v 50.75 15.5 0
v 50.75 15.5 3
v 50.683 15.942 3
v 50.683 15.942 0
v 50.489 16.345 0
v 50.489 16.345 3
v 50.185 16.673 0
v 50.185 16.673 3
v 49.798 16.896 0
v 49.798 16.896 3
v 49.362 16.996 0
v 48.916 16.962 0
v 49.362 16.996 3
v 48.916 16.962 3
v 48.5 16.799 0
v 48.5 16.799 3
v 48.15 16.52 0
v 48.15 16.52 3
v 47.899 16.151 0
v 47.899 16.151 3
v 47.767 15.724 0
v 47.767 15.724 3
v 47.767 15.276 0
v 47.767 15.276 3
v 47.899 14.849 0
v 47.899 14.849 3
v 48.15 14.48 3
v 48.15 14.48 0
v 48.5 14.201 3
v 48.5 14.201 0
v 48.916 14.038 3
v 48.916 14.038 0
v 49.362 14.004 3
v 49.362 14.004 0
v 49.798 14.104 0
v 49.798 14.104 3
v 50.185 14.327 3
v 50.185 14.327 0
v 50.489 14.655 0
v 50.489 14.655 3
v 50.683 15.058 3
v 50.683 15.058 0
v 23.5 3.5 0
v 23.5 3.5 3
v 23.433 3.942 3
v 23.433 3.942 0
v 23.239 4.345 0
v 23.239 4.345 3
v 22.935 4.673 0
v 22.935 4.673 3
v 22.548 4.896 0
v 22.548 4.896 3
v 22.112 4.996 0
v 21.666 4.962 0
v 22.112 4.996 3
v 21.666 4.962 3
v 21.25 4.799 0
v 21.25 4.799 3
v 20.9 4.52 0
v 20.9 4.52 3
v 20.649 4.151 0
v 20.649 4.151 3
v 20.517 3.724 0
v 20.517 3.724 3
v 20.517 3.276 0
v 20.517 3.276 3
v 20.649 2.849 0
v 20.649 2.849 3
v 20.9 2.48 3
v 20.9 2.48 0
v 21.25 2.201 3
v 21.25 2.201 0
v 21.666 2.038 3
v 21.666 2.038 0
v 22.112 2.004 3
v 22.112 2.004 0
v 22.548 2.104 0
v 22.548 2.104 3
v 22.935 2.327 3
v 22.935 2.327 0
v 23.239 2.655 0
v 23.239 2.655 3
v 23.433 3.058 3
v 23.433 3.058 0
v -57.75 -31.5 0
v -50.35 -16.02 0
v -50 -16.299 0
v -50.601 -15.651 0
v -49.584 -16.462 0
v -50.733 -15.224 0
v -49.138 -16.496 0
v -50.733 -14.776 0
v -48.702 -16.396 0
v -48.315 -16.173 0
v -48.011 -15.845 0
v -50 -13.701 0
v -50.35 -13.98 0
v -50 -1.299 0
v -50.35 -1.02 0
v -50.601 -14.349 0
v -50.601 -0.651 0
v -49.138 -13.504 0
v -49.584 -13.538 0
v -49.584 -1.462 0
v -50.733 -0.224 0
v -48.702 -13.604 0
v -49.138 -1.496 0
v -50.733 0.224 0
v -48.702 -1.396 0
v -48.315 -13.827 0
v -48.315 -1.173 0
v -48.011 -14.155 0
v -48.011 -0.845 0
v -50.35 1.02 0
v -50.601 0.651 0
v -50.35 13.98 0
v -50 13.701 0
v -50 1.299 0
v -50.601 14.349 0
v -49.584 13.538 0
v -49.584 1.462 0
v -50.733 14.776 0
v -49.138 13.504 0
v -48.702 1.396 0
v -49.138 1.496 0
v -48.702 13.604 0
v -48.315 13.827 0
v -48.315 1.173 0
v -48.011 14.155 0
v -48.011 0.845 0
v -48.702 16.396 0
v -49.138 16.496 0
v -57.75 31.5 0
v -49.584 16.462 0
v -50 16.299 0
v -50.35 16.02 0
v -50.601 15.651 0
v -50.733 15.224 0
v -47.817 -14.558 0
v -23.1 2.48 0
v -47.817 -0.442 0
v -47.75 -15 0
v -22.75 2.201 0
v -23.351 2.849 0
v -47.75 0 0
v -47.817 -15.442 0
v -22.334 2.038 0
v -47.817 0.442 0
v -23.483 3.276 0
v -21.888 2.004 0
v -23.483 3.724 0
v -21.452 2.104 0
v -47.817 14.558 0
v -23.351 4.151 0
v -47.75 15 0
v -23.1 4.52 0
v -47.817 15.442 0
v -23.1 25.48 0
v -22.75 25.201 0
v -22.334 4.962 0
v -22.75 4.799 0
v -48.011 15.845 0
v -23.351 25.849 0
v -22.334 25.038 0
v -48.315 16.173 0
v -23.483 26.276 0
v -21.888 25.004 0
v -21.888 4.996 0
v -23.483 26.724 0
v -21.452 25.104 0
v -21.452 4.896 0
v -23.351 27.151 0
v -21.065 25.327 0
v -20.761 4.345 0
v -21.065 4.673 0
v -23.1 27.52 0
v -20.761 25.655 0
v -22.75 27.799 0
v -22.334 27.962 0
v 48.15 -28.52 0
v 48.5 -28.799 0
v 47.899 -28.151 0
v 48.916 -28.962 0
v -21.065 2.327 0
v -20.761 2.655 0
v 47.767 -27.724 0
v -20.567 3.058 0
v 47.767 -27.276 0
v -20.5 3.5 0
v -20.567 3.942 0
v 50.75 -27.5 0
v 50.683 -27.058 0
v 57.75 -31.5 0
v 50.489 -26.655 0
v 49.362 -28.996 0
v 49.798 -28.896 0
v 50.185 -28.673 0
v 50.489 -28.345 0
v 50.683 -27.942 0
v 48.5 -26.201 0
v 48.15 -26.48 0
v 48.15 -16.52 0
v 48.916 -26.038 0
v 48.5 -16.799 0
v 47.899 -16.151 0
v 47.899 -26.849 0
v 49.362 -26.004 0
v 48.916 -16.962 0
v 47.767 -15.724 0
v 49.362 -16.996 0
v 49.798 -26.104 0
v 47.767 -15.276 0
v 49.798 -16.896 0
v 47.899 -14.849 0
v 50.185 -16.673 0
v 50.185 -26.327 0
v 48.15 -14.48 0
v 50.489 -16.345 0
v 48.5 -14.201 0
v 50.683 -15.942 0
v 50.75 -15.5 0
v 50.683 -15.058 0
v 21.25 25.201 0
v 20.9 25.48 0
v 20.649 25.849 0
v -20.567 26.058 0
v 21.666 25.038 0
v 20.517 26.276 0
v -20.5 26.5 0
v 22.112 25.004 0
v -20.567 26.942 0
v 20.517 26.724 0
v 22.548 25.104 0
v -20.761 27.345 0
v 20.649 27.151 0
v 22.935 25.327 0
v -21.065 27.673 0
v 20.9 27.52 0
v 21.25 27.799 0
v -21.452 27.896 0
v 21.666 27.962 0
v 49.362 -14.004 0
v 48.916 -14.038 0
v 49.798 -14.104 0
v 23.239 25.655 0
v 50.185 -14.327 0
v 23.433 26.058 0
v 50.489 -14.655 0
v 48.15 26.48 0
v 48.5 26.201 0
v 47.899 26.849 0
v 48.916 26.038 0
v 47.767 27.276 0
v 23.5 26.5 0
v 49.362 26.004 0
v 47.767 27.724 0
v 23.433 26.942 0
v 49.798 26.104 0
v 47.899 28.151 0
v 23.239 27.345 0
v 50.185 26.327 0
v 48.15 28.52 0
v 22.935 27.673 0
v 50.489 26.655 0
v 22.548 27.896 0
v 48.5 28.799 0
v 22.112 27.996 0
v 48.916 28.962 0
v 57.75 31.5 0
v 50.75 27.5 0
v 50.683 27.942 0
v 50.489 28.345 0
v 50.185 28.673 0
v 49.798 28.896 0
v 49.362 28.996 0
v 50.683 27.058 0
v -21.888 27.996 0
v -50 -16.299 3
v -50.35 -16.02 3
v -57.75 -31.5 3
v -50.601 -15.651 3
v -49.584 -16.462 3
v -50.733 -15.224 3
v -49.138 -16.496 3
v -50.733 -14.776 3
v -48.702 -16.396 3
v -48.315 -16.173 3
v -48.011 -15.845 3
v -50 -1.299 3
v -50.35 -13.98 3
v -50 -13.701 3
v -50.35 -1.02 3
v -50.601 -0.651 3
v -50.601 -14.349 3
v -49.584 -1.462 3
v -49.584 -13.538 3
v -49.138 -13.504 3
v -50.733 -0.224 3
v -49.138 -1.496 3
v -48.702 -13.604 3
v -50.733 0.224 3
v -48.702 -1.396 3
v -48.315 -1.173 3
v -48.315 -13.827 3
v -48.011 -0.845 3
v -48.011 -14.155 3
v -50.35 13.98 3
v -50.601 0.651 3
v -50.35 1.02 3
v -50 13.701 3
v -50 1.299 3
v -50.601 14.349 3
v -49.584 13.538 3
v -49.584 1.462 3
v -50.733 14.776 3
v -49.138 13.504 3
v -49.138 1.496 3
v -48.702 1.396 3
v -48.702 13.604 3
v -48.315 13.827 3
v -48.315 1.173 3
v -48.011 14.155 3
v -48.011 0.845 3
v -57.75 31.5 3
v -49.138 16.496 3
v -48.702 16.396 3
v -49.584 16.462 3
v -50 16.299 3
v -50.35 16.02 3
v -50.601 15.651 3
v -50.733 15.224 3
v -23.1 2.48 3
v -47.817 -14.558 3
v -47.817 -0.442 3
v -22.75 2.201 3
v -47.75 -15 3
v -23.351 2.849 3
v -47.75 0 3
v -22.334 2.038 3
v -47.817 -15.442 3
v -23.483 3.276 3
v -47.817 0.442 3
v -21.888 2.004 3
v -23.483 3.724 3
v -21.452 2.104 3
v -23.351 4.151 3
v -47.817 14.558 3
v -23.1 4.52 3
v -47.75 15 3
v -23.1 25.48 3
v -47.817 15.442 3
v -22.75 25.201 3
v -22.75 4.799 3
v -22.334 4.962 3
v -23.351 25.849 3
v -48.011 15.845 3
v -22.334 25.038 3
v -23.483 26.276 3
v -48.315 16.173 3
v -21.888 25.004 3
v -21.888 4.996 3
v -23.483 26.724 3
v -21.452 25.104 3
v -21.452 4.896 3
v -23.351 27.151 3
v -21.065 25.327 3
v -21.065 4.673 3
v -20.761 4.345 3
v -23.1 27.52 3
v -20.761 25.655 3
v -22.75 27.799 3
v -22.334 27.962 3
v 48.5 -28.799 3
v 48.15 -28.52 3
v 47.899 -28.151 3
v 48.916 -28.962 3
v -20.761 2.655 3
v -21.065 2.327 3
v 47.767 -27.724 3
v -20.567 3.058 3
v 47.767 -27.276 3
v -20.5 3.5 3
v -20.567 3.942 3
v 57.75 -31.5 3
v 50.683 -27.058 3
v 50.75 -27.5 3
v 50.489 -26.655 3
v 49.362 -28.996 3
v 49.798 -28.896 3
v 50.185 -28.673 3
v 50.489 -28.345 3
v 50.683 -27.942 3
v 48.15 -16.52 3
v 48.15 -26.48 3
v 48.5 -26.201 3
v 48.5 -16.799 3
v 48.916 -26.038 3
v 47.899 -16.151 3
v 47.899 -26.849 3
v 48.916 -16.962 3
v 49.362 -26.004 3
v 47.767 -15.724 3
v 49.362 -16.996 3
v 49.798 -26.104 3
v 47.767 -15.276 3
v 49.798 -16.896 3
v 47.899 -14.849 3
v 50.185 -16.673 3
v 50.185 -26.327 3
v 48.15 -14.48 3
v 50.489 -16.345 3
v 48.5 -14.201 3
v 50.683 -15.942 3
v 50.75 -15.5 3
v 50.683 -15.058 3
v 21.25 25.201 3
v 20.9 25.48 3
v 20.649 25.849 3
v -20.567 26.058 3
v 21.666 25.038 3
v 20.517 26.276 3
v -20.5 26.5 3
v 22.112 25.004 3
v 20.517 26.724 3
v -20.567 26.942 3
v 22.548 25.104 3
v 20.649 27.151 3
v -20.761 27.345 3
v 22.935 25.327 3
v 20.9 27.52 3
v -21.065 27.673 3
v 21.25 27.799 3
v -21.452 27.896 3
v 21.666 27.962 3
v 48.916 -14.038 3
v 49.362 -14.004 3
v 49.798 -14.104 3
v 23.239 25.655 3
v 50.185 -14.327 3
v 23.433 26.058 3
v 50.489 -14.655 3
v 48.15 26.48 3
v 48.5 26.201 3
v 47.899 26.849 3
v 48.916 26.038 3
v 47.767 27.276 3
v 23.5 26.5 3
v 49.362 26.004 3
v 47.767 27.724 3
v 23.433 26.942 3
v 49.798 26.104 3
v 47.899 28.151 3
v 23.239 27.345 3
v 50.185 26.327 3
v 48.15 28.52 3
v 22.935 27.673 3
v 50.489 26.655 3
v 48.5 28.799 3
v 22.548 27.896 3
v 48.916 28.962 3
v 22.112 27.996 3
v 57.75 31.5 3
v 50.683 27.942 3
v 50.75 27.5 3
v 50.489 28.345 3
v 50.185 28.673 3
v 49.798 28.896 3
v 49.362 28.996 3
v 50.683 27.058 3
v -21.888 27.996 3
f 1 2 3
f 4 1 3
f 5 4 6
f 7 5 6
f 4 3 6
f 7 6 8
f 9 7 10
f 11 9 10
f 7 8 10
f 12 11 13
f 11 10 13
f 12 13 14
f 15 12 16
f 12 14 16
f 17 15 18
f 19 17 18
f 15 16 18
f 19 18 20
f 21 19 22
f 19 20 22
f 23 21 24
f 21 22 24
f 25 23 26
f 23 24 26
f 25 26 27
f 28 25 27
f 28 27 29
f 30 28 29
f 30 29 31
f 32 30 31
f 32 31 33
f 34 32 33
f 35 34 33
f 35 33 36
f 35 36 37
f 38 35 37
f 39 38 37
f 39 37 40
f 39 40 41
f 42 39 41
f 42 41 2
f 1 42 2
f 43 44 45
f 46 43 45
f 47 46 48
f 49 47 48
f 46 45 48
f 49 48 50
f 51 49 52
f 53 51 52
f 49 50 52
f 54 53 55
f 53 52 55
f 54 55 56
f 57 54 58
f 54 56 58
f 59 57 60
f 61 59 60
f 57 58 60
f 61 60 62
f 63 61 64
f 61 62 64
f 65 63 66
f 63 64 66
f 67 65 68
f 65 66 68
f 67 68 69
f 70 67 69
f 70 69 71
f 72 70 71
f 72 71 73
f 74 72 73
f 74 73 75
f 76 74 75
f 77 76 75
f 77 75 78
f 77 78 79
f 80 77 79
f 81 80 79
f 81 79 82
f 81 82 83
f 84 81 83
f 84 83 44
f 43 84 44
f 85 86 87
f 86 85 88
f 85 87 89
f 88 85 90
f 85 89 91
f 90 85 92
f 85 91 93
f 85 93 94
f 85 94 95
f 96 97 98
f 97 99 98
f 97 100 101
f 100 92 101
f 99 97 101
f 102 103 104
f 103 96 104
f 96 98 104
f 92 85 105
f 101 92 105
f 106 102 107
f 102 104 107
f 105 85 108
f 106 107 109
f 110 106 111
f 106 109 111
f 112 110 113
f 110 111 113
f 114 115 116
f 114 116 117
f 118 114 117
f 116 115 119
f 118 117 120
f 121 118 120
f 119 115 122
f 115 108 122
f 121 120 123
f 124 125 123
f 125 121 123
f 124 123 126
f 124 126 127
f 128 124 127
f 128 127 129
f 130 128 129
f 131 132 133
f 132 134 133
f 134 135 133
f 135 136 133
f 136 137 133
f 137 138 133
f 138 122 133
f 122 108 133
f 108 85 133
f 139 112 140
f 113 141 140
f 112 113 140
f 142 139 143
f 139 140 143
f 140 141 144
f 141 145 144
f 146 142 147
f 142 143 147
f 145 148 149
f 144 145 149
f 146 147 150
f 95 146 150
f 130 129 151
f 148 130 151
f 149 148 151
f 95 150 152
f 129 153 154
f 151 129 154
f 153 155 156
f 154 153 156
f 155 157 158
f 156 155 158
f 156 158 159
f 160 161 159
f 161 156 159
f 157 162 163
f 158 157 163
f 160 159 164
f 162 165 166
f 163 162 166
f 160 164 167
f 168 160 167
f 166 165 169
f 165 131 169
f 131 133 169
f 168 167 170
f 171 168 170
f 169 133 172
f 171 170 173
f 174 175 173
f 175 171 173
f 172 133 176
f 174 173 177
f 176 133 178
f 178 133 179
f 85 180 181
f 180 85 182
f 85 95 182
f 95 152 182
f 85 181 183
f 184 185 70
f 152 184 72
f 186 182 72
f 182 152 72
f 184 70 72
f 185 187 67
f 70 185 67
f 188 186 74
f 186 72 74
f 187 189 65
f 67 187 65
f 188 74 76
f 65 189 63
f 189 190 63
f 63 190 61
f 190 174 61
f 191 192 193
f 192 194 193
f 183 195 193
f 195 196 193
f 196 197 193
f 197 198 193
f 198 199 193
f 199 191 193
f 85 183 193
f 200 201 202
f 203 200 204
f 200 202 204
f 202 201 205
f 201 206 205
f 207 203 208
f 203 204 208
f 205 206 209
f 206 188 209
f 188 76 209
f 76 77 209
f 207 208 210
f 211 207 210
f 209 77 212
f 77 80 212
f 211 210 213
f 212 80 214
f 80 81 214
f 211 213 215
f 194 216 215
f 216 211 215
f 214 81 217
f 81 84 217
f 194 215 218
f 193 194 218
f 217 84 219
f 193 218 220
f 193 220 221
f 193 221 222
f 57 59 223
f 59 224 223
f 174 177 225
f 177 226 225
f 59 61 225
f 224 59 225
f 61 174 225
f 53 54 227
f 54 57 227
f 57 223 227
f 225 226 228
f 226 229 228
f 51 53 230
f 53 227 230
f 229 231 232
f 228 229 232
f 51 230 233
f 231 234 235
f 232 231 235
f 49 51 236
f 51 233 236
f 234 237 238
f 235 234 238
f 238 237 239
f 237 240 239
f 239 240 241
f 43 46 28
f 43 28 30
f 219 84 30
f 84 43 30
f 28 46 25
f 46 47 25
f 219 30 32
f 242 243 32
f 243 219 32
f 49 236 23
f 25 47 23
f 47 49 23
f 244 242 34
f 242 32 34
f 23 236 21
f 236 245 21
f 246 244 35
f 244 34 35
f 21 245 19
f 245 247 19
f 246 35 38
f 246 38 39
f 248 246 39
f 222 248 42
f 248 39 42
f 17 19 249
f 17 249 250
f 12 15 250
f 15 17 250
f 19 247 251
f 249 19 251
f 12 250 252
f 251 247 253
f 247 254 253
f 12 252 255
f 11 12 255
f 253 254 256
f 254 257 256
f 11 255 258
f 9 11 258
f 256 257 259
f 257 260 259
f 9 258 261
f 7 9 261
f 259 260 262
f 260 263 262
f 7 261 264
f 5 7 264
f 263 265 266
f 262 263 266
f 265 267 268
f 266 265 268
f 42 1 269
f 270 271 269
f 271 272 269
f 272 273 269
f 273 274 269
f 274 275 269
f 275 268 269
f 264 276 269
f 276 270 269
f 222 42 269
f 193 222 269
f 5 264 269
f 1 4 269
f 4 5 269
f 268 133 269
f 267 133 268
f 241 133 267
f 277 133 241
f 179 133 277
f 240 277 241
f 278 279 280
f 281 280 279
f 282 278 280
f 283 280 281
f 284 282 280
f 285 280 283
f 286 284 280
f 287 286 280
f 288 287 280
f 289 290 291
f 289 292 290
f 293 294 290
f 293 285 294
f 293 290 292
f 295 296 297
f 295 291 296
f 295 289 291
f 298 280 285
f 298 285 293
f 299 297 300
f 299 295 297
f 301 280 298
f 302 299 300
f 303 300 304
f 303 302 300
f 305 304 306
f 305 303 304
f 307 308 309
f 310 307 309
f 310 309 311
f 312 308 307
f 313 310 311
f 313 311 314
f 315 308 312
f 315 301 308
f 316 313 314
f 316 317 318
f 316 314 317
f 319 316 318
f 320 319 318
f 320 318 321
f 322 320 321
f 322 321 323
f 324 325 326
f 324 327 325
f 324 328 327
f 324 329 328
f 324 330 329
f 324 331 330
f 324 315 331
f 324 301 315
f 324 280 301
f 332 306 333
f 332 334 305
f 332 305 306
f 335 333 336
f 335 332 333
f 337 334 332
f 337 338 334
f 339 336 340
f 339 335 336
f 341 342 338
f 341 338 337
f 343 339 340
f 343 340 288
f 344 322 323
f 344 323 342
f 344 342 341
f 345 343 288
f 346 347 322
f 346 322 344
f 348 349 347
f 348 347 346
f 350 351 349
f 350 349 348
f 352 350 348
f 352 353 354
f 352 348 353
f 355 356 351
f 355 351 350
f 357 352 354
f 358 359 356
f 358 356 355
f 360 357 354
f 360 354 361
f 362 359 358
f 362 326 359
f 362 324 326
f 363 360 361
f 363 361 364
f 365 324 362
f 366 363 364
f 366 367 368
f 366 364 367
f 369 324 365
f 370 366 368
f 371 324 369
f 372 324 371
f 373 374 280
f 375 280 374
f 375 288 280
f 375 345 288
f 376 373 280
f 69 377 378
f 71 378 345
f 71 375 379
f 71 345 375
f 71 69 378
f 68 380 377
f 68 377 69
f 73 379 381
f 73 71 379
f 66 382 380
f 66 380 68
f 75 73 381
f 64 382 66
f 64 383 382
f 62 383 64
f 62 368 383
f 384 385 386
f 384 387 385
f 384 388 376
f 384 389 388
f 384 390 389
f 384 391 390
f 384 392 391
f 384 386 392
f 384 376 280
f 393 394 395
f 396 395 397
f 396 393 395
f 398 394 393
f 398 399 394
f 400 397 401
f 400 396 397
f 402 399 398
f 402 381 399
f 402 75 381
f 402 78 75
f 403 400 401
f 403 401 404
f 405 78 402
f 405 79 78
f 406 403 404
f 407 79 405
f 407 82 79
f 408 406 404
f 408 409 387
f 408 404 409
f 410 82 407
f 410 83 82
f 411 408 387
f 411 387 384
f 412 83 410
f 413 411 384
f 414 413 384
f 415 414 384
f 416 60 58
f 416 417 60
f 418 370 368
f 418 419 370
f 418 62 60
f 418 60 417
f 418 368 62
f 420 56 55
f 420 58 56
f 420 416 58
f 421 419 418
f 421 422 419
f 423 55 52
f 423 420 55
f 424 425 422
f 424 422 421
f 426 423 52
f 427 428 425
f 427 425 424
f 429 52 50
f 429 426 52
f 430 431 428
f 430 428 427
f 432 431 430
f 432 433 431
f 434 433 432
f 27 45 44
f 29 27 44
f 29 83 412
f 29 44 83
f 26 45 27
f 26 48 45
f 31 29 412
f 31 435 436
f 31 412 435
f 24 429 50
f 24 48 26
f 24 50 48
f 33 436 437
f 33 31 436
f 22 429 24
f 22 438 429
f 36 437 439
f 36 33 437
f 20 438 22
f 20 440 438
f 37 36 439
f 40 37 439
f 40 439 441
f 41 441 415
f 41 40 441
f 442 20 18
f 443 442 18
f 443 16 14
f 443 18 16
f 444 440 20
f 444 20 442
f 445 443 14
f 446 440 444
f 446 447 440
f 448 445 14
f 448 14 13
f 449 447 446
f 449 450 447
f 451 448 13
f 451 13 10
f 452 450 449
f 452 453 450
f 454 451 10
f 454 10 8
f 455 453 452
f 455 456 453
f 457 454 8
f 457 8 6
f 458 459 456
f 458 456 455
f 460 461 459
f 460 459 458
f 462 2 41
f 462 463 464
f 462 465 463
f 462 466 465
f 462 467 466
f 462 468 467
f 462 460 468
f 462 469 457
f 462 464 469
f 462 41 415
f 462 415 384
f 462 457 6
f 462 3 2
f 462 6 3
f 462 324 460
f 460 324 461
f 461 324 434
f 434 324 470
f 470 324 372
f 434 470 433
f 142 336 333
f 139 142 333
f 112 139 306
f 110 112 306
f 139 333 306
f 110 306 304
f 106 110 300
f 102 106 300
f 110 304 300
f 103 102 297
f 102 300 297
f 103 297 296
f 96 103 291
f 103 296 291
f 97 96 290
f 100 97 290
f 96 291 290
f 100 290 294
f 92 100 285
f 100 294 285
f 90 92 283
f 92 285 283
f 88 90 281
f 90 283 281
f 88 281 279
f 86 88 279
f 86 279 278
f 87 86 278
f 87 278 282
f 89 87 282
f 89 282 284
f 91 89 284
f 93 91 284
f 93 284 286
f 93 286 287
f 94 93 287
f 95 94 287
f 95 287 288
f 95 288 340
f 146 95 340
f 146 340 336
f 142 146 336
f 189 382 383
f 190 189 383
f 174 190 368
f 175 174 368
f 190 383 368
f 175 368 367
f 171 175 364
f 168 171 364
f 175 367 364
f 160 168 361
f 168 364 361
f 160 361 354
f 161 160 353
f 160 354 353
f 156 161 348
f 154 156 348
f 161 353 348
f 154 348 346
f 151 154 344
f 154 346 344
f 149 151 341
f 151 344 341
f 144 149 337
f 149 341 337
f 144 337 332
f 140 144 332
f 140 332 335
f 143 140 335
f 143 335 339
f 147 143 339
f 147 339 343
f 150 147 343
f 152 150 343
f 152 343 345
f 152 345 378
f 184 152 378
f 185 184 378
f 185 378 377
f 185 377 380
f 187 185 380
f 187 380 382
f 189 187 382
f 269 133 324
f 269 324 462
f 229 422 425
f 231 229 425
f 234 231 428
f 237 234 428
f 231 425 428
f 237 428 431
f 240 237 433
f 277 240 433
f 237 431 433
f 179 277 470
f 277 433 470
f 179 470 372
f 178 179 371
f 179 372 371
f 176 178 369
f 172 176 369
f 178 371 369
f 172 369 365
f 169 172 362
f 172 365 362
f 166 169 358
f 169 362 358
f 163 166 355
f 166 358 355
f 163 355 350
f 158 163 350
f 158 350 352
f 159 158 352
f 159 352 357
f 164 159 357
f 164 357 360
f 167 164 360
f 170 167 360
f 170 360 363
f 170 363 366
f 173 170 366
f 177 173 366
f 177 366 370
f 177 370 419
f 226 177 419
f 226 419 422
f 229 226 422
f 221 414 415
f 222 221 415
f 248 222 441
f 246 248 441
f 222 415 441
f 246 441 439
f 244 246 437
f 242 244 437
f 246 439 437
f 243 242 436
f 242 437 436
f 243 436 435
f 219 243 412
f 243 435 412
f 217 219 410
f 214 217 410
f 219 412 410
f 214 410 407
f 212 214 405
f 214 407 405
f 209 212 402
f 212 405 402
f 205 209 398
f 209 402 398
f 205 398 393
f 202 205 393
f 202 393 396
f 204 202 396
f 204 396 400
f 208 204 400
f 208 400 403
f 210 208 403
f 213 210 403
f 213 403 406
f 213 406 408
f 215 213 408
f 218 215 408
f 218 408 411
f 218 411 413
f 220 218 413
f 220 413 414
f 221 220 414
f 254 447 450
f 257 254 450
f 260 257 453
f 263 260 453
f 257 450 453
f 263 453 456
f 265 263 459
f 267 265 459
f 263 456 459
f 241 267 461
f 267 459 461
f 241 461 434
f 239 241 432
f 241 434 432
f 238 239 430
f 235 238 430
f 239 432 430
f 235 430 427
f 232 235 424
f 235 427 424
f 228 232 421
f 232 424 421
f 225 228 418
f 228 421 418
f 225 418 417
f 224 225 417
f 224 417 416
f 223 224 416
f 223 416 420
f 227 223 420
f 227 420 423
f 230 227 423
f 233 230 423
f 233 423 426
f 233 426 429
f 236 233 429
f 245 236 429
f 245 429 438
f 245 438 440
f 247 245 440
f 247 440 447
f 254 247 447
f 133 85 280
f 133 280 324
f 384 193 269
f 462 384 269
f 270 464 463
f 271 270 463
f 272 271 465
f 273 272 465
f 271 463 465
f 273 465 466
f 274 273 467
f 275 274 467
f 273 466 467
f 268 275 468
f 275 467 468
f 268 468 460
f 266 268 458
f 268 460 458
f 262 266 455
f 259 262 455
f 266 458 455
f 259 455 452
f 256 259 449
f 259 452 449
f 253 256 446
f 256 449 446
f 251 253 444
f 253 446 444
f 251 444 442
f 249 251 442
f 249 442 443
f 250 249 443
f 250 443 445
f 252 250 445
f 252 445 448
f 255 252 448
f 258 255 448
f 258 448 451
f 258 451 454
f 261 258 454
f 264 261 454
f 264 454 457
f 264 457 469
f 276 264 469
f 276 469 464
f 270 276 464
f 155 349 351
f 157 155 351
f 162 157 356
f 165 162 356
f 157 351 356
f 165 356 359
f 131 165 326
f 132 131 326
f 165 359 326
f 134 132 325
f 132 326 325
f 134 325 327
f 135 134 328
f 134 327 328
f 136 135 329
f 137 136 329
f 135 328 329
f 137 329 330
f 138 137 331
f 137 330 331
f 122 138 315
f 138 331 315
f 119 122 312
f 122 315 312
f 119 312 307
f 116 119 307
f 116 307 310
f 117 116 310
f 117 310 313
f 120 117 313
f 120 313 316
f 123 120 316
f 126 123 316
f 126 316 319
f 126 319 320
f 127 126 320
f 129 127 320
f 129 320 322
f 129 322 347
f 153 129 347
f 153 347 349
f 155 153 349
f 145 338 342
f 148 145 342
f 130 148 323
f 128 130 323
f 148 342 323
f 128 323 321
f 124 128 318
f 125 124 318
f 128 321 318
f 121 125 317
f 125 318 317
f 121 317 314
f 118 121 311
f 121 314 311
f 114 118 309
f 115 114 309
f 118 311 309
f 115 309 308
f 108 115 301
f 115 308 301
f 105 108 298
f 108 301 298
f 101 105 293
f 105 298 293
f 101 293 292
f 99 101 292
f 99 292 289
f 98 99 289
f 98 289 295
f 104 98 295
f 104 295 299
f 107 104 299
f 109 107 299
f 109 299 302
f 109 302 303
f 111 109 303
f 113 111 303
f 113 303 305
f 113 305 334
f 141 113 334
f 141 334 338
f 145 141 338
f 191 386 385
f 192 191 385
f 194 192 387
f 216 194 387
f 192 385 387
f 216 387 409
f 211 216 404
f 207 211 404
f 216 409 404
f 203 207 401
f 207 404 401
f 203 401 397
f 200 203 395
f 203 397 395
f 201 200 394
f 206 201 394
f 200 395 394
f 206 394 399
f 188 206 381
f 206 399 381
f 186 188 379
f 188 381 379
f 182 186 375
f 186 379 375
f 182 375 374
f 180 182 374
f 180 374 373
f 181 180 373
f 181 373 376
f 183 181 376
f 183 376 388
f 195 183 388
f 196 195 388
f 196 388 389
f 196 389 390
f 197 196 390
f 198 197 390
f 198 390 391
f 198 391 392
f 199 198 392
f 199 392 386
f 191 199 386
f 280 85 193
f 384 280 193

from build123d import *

# Parameters (mm, degrees)
SKETCH_1_W          = 115.5
SKETCH_1_H          = 63
EXTRUDE_1_DEPTH     = 3
SKETCH_2_R          = 1.5
CUT_EXTRUDE_1_DEPTH = 66.850683368
SKETCH_3_R          = 1.5
CUT_EXTRUDE_2_DEPTH = 66.850683368


with BuildPart() as part:
    # 草图1 → 凸台-拉伸1 (new body)
    with BuildSketch(Plane.XY):
        Rectangle(SKETCH_1_W, SKETCH_1_H)
    extrude(amount=EXTRUDE_1_DEPTH)

    # 草图2 → 切除-拉伸1 (cut, through all)
    with BuildSketch(Plane.XY.offset(3)):
        with Locations((49.25, 27.5)):
            Circle(SKETCH_2_R)
        with Locations((49.25, -27.5)):
            Circle(SKETCH_2_R)
        with Locations((49.25, 15.5)):
            Circle(SKETCH_2_R)
        with Locations((49.25, -15.5)):
            Circle(SKETCH_2_R)
        with Locations((-49.25, 0)):
            Circle(SKETCH_2_R)
        with Locations((-49.25, 15)):
            Circle(SKETCH_2_R)
        with Locations((-49.25, -15)):
            Circle(SKETCH_2_R)
    extrude(amount=-CUT_EXTRUDE_1_DEPTH, mode=Mode.SUBTRACT)

    # 草图3 → 切除-拉伸2 (cut, through all)
    with BuildSketch(Plane.XY.offset(3)):
        with Locations((-22, 26.5)):
            Circle(SKETCH_3_R)
        with Locations((22, 26.5)):
            Circle(SKETCH_3_R)
        with Locations((22, 3.5)):
            Circle(SKETCH_3_R)
        with Locations((-22, 3.5)):
            Circle(SKETCH_3_R)
    extrude(amount=-CUT_EXTRUDE_2_DEPTH, mode=Mode.SUBTRACT)


solid = part.part
